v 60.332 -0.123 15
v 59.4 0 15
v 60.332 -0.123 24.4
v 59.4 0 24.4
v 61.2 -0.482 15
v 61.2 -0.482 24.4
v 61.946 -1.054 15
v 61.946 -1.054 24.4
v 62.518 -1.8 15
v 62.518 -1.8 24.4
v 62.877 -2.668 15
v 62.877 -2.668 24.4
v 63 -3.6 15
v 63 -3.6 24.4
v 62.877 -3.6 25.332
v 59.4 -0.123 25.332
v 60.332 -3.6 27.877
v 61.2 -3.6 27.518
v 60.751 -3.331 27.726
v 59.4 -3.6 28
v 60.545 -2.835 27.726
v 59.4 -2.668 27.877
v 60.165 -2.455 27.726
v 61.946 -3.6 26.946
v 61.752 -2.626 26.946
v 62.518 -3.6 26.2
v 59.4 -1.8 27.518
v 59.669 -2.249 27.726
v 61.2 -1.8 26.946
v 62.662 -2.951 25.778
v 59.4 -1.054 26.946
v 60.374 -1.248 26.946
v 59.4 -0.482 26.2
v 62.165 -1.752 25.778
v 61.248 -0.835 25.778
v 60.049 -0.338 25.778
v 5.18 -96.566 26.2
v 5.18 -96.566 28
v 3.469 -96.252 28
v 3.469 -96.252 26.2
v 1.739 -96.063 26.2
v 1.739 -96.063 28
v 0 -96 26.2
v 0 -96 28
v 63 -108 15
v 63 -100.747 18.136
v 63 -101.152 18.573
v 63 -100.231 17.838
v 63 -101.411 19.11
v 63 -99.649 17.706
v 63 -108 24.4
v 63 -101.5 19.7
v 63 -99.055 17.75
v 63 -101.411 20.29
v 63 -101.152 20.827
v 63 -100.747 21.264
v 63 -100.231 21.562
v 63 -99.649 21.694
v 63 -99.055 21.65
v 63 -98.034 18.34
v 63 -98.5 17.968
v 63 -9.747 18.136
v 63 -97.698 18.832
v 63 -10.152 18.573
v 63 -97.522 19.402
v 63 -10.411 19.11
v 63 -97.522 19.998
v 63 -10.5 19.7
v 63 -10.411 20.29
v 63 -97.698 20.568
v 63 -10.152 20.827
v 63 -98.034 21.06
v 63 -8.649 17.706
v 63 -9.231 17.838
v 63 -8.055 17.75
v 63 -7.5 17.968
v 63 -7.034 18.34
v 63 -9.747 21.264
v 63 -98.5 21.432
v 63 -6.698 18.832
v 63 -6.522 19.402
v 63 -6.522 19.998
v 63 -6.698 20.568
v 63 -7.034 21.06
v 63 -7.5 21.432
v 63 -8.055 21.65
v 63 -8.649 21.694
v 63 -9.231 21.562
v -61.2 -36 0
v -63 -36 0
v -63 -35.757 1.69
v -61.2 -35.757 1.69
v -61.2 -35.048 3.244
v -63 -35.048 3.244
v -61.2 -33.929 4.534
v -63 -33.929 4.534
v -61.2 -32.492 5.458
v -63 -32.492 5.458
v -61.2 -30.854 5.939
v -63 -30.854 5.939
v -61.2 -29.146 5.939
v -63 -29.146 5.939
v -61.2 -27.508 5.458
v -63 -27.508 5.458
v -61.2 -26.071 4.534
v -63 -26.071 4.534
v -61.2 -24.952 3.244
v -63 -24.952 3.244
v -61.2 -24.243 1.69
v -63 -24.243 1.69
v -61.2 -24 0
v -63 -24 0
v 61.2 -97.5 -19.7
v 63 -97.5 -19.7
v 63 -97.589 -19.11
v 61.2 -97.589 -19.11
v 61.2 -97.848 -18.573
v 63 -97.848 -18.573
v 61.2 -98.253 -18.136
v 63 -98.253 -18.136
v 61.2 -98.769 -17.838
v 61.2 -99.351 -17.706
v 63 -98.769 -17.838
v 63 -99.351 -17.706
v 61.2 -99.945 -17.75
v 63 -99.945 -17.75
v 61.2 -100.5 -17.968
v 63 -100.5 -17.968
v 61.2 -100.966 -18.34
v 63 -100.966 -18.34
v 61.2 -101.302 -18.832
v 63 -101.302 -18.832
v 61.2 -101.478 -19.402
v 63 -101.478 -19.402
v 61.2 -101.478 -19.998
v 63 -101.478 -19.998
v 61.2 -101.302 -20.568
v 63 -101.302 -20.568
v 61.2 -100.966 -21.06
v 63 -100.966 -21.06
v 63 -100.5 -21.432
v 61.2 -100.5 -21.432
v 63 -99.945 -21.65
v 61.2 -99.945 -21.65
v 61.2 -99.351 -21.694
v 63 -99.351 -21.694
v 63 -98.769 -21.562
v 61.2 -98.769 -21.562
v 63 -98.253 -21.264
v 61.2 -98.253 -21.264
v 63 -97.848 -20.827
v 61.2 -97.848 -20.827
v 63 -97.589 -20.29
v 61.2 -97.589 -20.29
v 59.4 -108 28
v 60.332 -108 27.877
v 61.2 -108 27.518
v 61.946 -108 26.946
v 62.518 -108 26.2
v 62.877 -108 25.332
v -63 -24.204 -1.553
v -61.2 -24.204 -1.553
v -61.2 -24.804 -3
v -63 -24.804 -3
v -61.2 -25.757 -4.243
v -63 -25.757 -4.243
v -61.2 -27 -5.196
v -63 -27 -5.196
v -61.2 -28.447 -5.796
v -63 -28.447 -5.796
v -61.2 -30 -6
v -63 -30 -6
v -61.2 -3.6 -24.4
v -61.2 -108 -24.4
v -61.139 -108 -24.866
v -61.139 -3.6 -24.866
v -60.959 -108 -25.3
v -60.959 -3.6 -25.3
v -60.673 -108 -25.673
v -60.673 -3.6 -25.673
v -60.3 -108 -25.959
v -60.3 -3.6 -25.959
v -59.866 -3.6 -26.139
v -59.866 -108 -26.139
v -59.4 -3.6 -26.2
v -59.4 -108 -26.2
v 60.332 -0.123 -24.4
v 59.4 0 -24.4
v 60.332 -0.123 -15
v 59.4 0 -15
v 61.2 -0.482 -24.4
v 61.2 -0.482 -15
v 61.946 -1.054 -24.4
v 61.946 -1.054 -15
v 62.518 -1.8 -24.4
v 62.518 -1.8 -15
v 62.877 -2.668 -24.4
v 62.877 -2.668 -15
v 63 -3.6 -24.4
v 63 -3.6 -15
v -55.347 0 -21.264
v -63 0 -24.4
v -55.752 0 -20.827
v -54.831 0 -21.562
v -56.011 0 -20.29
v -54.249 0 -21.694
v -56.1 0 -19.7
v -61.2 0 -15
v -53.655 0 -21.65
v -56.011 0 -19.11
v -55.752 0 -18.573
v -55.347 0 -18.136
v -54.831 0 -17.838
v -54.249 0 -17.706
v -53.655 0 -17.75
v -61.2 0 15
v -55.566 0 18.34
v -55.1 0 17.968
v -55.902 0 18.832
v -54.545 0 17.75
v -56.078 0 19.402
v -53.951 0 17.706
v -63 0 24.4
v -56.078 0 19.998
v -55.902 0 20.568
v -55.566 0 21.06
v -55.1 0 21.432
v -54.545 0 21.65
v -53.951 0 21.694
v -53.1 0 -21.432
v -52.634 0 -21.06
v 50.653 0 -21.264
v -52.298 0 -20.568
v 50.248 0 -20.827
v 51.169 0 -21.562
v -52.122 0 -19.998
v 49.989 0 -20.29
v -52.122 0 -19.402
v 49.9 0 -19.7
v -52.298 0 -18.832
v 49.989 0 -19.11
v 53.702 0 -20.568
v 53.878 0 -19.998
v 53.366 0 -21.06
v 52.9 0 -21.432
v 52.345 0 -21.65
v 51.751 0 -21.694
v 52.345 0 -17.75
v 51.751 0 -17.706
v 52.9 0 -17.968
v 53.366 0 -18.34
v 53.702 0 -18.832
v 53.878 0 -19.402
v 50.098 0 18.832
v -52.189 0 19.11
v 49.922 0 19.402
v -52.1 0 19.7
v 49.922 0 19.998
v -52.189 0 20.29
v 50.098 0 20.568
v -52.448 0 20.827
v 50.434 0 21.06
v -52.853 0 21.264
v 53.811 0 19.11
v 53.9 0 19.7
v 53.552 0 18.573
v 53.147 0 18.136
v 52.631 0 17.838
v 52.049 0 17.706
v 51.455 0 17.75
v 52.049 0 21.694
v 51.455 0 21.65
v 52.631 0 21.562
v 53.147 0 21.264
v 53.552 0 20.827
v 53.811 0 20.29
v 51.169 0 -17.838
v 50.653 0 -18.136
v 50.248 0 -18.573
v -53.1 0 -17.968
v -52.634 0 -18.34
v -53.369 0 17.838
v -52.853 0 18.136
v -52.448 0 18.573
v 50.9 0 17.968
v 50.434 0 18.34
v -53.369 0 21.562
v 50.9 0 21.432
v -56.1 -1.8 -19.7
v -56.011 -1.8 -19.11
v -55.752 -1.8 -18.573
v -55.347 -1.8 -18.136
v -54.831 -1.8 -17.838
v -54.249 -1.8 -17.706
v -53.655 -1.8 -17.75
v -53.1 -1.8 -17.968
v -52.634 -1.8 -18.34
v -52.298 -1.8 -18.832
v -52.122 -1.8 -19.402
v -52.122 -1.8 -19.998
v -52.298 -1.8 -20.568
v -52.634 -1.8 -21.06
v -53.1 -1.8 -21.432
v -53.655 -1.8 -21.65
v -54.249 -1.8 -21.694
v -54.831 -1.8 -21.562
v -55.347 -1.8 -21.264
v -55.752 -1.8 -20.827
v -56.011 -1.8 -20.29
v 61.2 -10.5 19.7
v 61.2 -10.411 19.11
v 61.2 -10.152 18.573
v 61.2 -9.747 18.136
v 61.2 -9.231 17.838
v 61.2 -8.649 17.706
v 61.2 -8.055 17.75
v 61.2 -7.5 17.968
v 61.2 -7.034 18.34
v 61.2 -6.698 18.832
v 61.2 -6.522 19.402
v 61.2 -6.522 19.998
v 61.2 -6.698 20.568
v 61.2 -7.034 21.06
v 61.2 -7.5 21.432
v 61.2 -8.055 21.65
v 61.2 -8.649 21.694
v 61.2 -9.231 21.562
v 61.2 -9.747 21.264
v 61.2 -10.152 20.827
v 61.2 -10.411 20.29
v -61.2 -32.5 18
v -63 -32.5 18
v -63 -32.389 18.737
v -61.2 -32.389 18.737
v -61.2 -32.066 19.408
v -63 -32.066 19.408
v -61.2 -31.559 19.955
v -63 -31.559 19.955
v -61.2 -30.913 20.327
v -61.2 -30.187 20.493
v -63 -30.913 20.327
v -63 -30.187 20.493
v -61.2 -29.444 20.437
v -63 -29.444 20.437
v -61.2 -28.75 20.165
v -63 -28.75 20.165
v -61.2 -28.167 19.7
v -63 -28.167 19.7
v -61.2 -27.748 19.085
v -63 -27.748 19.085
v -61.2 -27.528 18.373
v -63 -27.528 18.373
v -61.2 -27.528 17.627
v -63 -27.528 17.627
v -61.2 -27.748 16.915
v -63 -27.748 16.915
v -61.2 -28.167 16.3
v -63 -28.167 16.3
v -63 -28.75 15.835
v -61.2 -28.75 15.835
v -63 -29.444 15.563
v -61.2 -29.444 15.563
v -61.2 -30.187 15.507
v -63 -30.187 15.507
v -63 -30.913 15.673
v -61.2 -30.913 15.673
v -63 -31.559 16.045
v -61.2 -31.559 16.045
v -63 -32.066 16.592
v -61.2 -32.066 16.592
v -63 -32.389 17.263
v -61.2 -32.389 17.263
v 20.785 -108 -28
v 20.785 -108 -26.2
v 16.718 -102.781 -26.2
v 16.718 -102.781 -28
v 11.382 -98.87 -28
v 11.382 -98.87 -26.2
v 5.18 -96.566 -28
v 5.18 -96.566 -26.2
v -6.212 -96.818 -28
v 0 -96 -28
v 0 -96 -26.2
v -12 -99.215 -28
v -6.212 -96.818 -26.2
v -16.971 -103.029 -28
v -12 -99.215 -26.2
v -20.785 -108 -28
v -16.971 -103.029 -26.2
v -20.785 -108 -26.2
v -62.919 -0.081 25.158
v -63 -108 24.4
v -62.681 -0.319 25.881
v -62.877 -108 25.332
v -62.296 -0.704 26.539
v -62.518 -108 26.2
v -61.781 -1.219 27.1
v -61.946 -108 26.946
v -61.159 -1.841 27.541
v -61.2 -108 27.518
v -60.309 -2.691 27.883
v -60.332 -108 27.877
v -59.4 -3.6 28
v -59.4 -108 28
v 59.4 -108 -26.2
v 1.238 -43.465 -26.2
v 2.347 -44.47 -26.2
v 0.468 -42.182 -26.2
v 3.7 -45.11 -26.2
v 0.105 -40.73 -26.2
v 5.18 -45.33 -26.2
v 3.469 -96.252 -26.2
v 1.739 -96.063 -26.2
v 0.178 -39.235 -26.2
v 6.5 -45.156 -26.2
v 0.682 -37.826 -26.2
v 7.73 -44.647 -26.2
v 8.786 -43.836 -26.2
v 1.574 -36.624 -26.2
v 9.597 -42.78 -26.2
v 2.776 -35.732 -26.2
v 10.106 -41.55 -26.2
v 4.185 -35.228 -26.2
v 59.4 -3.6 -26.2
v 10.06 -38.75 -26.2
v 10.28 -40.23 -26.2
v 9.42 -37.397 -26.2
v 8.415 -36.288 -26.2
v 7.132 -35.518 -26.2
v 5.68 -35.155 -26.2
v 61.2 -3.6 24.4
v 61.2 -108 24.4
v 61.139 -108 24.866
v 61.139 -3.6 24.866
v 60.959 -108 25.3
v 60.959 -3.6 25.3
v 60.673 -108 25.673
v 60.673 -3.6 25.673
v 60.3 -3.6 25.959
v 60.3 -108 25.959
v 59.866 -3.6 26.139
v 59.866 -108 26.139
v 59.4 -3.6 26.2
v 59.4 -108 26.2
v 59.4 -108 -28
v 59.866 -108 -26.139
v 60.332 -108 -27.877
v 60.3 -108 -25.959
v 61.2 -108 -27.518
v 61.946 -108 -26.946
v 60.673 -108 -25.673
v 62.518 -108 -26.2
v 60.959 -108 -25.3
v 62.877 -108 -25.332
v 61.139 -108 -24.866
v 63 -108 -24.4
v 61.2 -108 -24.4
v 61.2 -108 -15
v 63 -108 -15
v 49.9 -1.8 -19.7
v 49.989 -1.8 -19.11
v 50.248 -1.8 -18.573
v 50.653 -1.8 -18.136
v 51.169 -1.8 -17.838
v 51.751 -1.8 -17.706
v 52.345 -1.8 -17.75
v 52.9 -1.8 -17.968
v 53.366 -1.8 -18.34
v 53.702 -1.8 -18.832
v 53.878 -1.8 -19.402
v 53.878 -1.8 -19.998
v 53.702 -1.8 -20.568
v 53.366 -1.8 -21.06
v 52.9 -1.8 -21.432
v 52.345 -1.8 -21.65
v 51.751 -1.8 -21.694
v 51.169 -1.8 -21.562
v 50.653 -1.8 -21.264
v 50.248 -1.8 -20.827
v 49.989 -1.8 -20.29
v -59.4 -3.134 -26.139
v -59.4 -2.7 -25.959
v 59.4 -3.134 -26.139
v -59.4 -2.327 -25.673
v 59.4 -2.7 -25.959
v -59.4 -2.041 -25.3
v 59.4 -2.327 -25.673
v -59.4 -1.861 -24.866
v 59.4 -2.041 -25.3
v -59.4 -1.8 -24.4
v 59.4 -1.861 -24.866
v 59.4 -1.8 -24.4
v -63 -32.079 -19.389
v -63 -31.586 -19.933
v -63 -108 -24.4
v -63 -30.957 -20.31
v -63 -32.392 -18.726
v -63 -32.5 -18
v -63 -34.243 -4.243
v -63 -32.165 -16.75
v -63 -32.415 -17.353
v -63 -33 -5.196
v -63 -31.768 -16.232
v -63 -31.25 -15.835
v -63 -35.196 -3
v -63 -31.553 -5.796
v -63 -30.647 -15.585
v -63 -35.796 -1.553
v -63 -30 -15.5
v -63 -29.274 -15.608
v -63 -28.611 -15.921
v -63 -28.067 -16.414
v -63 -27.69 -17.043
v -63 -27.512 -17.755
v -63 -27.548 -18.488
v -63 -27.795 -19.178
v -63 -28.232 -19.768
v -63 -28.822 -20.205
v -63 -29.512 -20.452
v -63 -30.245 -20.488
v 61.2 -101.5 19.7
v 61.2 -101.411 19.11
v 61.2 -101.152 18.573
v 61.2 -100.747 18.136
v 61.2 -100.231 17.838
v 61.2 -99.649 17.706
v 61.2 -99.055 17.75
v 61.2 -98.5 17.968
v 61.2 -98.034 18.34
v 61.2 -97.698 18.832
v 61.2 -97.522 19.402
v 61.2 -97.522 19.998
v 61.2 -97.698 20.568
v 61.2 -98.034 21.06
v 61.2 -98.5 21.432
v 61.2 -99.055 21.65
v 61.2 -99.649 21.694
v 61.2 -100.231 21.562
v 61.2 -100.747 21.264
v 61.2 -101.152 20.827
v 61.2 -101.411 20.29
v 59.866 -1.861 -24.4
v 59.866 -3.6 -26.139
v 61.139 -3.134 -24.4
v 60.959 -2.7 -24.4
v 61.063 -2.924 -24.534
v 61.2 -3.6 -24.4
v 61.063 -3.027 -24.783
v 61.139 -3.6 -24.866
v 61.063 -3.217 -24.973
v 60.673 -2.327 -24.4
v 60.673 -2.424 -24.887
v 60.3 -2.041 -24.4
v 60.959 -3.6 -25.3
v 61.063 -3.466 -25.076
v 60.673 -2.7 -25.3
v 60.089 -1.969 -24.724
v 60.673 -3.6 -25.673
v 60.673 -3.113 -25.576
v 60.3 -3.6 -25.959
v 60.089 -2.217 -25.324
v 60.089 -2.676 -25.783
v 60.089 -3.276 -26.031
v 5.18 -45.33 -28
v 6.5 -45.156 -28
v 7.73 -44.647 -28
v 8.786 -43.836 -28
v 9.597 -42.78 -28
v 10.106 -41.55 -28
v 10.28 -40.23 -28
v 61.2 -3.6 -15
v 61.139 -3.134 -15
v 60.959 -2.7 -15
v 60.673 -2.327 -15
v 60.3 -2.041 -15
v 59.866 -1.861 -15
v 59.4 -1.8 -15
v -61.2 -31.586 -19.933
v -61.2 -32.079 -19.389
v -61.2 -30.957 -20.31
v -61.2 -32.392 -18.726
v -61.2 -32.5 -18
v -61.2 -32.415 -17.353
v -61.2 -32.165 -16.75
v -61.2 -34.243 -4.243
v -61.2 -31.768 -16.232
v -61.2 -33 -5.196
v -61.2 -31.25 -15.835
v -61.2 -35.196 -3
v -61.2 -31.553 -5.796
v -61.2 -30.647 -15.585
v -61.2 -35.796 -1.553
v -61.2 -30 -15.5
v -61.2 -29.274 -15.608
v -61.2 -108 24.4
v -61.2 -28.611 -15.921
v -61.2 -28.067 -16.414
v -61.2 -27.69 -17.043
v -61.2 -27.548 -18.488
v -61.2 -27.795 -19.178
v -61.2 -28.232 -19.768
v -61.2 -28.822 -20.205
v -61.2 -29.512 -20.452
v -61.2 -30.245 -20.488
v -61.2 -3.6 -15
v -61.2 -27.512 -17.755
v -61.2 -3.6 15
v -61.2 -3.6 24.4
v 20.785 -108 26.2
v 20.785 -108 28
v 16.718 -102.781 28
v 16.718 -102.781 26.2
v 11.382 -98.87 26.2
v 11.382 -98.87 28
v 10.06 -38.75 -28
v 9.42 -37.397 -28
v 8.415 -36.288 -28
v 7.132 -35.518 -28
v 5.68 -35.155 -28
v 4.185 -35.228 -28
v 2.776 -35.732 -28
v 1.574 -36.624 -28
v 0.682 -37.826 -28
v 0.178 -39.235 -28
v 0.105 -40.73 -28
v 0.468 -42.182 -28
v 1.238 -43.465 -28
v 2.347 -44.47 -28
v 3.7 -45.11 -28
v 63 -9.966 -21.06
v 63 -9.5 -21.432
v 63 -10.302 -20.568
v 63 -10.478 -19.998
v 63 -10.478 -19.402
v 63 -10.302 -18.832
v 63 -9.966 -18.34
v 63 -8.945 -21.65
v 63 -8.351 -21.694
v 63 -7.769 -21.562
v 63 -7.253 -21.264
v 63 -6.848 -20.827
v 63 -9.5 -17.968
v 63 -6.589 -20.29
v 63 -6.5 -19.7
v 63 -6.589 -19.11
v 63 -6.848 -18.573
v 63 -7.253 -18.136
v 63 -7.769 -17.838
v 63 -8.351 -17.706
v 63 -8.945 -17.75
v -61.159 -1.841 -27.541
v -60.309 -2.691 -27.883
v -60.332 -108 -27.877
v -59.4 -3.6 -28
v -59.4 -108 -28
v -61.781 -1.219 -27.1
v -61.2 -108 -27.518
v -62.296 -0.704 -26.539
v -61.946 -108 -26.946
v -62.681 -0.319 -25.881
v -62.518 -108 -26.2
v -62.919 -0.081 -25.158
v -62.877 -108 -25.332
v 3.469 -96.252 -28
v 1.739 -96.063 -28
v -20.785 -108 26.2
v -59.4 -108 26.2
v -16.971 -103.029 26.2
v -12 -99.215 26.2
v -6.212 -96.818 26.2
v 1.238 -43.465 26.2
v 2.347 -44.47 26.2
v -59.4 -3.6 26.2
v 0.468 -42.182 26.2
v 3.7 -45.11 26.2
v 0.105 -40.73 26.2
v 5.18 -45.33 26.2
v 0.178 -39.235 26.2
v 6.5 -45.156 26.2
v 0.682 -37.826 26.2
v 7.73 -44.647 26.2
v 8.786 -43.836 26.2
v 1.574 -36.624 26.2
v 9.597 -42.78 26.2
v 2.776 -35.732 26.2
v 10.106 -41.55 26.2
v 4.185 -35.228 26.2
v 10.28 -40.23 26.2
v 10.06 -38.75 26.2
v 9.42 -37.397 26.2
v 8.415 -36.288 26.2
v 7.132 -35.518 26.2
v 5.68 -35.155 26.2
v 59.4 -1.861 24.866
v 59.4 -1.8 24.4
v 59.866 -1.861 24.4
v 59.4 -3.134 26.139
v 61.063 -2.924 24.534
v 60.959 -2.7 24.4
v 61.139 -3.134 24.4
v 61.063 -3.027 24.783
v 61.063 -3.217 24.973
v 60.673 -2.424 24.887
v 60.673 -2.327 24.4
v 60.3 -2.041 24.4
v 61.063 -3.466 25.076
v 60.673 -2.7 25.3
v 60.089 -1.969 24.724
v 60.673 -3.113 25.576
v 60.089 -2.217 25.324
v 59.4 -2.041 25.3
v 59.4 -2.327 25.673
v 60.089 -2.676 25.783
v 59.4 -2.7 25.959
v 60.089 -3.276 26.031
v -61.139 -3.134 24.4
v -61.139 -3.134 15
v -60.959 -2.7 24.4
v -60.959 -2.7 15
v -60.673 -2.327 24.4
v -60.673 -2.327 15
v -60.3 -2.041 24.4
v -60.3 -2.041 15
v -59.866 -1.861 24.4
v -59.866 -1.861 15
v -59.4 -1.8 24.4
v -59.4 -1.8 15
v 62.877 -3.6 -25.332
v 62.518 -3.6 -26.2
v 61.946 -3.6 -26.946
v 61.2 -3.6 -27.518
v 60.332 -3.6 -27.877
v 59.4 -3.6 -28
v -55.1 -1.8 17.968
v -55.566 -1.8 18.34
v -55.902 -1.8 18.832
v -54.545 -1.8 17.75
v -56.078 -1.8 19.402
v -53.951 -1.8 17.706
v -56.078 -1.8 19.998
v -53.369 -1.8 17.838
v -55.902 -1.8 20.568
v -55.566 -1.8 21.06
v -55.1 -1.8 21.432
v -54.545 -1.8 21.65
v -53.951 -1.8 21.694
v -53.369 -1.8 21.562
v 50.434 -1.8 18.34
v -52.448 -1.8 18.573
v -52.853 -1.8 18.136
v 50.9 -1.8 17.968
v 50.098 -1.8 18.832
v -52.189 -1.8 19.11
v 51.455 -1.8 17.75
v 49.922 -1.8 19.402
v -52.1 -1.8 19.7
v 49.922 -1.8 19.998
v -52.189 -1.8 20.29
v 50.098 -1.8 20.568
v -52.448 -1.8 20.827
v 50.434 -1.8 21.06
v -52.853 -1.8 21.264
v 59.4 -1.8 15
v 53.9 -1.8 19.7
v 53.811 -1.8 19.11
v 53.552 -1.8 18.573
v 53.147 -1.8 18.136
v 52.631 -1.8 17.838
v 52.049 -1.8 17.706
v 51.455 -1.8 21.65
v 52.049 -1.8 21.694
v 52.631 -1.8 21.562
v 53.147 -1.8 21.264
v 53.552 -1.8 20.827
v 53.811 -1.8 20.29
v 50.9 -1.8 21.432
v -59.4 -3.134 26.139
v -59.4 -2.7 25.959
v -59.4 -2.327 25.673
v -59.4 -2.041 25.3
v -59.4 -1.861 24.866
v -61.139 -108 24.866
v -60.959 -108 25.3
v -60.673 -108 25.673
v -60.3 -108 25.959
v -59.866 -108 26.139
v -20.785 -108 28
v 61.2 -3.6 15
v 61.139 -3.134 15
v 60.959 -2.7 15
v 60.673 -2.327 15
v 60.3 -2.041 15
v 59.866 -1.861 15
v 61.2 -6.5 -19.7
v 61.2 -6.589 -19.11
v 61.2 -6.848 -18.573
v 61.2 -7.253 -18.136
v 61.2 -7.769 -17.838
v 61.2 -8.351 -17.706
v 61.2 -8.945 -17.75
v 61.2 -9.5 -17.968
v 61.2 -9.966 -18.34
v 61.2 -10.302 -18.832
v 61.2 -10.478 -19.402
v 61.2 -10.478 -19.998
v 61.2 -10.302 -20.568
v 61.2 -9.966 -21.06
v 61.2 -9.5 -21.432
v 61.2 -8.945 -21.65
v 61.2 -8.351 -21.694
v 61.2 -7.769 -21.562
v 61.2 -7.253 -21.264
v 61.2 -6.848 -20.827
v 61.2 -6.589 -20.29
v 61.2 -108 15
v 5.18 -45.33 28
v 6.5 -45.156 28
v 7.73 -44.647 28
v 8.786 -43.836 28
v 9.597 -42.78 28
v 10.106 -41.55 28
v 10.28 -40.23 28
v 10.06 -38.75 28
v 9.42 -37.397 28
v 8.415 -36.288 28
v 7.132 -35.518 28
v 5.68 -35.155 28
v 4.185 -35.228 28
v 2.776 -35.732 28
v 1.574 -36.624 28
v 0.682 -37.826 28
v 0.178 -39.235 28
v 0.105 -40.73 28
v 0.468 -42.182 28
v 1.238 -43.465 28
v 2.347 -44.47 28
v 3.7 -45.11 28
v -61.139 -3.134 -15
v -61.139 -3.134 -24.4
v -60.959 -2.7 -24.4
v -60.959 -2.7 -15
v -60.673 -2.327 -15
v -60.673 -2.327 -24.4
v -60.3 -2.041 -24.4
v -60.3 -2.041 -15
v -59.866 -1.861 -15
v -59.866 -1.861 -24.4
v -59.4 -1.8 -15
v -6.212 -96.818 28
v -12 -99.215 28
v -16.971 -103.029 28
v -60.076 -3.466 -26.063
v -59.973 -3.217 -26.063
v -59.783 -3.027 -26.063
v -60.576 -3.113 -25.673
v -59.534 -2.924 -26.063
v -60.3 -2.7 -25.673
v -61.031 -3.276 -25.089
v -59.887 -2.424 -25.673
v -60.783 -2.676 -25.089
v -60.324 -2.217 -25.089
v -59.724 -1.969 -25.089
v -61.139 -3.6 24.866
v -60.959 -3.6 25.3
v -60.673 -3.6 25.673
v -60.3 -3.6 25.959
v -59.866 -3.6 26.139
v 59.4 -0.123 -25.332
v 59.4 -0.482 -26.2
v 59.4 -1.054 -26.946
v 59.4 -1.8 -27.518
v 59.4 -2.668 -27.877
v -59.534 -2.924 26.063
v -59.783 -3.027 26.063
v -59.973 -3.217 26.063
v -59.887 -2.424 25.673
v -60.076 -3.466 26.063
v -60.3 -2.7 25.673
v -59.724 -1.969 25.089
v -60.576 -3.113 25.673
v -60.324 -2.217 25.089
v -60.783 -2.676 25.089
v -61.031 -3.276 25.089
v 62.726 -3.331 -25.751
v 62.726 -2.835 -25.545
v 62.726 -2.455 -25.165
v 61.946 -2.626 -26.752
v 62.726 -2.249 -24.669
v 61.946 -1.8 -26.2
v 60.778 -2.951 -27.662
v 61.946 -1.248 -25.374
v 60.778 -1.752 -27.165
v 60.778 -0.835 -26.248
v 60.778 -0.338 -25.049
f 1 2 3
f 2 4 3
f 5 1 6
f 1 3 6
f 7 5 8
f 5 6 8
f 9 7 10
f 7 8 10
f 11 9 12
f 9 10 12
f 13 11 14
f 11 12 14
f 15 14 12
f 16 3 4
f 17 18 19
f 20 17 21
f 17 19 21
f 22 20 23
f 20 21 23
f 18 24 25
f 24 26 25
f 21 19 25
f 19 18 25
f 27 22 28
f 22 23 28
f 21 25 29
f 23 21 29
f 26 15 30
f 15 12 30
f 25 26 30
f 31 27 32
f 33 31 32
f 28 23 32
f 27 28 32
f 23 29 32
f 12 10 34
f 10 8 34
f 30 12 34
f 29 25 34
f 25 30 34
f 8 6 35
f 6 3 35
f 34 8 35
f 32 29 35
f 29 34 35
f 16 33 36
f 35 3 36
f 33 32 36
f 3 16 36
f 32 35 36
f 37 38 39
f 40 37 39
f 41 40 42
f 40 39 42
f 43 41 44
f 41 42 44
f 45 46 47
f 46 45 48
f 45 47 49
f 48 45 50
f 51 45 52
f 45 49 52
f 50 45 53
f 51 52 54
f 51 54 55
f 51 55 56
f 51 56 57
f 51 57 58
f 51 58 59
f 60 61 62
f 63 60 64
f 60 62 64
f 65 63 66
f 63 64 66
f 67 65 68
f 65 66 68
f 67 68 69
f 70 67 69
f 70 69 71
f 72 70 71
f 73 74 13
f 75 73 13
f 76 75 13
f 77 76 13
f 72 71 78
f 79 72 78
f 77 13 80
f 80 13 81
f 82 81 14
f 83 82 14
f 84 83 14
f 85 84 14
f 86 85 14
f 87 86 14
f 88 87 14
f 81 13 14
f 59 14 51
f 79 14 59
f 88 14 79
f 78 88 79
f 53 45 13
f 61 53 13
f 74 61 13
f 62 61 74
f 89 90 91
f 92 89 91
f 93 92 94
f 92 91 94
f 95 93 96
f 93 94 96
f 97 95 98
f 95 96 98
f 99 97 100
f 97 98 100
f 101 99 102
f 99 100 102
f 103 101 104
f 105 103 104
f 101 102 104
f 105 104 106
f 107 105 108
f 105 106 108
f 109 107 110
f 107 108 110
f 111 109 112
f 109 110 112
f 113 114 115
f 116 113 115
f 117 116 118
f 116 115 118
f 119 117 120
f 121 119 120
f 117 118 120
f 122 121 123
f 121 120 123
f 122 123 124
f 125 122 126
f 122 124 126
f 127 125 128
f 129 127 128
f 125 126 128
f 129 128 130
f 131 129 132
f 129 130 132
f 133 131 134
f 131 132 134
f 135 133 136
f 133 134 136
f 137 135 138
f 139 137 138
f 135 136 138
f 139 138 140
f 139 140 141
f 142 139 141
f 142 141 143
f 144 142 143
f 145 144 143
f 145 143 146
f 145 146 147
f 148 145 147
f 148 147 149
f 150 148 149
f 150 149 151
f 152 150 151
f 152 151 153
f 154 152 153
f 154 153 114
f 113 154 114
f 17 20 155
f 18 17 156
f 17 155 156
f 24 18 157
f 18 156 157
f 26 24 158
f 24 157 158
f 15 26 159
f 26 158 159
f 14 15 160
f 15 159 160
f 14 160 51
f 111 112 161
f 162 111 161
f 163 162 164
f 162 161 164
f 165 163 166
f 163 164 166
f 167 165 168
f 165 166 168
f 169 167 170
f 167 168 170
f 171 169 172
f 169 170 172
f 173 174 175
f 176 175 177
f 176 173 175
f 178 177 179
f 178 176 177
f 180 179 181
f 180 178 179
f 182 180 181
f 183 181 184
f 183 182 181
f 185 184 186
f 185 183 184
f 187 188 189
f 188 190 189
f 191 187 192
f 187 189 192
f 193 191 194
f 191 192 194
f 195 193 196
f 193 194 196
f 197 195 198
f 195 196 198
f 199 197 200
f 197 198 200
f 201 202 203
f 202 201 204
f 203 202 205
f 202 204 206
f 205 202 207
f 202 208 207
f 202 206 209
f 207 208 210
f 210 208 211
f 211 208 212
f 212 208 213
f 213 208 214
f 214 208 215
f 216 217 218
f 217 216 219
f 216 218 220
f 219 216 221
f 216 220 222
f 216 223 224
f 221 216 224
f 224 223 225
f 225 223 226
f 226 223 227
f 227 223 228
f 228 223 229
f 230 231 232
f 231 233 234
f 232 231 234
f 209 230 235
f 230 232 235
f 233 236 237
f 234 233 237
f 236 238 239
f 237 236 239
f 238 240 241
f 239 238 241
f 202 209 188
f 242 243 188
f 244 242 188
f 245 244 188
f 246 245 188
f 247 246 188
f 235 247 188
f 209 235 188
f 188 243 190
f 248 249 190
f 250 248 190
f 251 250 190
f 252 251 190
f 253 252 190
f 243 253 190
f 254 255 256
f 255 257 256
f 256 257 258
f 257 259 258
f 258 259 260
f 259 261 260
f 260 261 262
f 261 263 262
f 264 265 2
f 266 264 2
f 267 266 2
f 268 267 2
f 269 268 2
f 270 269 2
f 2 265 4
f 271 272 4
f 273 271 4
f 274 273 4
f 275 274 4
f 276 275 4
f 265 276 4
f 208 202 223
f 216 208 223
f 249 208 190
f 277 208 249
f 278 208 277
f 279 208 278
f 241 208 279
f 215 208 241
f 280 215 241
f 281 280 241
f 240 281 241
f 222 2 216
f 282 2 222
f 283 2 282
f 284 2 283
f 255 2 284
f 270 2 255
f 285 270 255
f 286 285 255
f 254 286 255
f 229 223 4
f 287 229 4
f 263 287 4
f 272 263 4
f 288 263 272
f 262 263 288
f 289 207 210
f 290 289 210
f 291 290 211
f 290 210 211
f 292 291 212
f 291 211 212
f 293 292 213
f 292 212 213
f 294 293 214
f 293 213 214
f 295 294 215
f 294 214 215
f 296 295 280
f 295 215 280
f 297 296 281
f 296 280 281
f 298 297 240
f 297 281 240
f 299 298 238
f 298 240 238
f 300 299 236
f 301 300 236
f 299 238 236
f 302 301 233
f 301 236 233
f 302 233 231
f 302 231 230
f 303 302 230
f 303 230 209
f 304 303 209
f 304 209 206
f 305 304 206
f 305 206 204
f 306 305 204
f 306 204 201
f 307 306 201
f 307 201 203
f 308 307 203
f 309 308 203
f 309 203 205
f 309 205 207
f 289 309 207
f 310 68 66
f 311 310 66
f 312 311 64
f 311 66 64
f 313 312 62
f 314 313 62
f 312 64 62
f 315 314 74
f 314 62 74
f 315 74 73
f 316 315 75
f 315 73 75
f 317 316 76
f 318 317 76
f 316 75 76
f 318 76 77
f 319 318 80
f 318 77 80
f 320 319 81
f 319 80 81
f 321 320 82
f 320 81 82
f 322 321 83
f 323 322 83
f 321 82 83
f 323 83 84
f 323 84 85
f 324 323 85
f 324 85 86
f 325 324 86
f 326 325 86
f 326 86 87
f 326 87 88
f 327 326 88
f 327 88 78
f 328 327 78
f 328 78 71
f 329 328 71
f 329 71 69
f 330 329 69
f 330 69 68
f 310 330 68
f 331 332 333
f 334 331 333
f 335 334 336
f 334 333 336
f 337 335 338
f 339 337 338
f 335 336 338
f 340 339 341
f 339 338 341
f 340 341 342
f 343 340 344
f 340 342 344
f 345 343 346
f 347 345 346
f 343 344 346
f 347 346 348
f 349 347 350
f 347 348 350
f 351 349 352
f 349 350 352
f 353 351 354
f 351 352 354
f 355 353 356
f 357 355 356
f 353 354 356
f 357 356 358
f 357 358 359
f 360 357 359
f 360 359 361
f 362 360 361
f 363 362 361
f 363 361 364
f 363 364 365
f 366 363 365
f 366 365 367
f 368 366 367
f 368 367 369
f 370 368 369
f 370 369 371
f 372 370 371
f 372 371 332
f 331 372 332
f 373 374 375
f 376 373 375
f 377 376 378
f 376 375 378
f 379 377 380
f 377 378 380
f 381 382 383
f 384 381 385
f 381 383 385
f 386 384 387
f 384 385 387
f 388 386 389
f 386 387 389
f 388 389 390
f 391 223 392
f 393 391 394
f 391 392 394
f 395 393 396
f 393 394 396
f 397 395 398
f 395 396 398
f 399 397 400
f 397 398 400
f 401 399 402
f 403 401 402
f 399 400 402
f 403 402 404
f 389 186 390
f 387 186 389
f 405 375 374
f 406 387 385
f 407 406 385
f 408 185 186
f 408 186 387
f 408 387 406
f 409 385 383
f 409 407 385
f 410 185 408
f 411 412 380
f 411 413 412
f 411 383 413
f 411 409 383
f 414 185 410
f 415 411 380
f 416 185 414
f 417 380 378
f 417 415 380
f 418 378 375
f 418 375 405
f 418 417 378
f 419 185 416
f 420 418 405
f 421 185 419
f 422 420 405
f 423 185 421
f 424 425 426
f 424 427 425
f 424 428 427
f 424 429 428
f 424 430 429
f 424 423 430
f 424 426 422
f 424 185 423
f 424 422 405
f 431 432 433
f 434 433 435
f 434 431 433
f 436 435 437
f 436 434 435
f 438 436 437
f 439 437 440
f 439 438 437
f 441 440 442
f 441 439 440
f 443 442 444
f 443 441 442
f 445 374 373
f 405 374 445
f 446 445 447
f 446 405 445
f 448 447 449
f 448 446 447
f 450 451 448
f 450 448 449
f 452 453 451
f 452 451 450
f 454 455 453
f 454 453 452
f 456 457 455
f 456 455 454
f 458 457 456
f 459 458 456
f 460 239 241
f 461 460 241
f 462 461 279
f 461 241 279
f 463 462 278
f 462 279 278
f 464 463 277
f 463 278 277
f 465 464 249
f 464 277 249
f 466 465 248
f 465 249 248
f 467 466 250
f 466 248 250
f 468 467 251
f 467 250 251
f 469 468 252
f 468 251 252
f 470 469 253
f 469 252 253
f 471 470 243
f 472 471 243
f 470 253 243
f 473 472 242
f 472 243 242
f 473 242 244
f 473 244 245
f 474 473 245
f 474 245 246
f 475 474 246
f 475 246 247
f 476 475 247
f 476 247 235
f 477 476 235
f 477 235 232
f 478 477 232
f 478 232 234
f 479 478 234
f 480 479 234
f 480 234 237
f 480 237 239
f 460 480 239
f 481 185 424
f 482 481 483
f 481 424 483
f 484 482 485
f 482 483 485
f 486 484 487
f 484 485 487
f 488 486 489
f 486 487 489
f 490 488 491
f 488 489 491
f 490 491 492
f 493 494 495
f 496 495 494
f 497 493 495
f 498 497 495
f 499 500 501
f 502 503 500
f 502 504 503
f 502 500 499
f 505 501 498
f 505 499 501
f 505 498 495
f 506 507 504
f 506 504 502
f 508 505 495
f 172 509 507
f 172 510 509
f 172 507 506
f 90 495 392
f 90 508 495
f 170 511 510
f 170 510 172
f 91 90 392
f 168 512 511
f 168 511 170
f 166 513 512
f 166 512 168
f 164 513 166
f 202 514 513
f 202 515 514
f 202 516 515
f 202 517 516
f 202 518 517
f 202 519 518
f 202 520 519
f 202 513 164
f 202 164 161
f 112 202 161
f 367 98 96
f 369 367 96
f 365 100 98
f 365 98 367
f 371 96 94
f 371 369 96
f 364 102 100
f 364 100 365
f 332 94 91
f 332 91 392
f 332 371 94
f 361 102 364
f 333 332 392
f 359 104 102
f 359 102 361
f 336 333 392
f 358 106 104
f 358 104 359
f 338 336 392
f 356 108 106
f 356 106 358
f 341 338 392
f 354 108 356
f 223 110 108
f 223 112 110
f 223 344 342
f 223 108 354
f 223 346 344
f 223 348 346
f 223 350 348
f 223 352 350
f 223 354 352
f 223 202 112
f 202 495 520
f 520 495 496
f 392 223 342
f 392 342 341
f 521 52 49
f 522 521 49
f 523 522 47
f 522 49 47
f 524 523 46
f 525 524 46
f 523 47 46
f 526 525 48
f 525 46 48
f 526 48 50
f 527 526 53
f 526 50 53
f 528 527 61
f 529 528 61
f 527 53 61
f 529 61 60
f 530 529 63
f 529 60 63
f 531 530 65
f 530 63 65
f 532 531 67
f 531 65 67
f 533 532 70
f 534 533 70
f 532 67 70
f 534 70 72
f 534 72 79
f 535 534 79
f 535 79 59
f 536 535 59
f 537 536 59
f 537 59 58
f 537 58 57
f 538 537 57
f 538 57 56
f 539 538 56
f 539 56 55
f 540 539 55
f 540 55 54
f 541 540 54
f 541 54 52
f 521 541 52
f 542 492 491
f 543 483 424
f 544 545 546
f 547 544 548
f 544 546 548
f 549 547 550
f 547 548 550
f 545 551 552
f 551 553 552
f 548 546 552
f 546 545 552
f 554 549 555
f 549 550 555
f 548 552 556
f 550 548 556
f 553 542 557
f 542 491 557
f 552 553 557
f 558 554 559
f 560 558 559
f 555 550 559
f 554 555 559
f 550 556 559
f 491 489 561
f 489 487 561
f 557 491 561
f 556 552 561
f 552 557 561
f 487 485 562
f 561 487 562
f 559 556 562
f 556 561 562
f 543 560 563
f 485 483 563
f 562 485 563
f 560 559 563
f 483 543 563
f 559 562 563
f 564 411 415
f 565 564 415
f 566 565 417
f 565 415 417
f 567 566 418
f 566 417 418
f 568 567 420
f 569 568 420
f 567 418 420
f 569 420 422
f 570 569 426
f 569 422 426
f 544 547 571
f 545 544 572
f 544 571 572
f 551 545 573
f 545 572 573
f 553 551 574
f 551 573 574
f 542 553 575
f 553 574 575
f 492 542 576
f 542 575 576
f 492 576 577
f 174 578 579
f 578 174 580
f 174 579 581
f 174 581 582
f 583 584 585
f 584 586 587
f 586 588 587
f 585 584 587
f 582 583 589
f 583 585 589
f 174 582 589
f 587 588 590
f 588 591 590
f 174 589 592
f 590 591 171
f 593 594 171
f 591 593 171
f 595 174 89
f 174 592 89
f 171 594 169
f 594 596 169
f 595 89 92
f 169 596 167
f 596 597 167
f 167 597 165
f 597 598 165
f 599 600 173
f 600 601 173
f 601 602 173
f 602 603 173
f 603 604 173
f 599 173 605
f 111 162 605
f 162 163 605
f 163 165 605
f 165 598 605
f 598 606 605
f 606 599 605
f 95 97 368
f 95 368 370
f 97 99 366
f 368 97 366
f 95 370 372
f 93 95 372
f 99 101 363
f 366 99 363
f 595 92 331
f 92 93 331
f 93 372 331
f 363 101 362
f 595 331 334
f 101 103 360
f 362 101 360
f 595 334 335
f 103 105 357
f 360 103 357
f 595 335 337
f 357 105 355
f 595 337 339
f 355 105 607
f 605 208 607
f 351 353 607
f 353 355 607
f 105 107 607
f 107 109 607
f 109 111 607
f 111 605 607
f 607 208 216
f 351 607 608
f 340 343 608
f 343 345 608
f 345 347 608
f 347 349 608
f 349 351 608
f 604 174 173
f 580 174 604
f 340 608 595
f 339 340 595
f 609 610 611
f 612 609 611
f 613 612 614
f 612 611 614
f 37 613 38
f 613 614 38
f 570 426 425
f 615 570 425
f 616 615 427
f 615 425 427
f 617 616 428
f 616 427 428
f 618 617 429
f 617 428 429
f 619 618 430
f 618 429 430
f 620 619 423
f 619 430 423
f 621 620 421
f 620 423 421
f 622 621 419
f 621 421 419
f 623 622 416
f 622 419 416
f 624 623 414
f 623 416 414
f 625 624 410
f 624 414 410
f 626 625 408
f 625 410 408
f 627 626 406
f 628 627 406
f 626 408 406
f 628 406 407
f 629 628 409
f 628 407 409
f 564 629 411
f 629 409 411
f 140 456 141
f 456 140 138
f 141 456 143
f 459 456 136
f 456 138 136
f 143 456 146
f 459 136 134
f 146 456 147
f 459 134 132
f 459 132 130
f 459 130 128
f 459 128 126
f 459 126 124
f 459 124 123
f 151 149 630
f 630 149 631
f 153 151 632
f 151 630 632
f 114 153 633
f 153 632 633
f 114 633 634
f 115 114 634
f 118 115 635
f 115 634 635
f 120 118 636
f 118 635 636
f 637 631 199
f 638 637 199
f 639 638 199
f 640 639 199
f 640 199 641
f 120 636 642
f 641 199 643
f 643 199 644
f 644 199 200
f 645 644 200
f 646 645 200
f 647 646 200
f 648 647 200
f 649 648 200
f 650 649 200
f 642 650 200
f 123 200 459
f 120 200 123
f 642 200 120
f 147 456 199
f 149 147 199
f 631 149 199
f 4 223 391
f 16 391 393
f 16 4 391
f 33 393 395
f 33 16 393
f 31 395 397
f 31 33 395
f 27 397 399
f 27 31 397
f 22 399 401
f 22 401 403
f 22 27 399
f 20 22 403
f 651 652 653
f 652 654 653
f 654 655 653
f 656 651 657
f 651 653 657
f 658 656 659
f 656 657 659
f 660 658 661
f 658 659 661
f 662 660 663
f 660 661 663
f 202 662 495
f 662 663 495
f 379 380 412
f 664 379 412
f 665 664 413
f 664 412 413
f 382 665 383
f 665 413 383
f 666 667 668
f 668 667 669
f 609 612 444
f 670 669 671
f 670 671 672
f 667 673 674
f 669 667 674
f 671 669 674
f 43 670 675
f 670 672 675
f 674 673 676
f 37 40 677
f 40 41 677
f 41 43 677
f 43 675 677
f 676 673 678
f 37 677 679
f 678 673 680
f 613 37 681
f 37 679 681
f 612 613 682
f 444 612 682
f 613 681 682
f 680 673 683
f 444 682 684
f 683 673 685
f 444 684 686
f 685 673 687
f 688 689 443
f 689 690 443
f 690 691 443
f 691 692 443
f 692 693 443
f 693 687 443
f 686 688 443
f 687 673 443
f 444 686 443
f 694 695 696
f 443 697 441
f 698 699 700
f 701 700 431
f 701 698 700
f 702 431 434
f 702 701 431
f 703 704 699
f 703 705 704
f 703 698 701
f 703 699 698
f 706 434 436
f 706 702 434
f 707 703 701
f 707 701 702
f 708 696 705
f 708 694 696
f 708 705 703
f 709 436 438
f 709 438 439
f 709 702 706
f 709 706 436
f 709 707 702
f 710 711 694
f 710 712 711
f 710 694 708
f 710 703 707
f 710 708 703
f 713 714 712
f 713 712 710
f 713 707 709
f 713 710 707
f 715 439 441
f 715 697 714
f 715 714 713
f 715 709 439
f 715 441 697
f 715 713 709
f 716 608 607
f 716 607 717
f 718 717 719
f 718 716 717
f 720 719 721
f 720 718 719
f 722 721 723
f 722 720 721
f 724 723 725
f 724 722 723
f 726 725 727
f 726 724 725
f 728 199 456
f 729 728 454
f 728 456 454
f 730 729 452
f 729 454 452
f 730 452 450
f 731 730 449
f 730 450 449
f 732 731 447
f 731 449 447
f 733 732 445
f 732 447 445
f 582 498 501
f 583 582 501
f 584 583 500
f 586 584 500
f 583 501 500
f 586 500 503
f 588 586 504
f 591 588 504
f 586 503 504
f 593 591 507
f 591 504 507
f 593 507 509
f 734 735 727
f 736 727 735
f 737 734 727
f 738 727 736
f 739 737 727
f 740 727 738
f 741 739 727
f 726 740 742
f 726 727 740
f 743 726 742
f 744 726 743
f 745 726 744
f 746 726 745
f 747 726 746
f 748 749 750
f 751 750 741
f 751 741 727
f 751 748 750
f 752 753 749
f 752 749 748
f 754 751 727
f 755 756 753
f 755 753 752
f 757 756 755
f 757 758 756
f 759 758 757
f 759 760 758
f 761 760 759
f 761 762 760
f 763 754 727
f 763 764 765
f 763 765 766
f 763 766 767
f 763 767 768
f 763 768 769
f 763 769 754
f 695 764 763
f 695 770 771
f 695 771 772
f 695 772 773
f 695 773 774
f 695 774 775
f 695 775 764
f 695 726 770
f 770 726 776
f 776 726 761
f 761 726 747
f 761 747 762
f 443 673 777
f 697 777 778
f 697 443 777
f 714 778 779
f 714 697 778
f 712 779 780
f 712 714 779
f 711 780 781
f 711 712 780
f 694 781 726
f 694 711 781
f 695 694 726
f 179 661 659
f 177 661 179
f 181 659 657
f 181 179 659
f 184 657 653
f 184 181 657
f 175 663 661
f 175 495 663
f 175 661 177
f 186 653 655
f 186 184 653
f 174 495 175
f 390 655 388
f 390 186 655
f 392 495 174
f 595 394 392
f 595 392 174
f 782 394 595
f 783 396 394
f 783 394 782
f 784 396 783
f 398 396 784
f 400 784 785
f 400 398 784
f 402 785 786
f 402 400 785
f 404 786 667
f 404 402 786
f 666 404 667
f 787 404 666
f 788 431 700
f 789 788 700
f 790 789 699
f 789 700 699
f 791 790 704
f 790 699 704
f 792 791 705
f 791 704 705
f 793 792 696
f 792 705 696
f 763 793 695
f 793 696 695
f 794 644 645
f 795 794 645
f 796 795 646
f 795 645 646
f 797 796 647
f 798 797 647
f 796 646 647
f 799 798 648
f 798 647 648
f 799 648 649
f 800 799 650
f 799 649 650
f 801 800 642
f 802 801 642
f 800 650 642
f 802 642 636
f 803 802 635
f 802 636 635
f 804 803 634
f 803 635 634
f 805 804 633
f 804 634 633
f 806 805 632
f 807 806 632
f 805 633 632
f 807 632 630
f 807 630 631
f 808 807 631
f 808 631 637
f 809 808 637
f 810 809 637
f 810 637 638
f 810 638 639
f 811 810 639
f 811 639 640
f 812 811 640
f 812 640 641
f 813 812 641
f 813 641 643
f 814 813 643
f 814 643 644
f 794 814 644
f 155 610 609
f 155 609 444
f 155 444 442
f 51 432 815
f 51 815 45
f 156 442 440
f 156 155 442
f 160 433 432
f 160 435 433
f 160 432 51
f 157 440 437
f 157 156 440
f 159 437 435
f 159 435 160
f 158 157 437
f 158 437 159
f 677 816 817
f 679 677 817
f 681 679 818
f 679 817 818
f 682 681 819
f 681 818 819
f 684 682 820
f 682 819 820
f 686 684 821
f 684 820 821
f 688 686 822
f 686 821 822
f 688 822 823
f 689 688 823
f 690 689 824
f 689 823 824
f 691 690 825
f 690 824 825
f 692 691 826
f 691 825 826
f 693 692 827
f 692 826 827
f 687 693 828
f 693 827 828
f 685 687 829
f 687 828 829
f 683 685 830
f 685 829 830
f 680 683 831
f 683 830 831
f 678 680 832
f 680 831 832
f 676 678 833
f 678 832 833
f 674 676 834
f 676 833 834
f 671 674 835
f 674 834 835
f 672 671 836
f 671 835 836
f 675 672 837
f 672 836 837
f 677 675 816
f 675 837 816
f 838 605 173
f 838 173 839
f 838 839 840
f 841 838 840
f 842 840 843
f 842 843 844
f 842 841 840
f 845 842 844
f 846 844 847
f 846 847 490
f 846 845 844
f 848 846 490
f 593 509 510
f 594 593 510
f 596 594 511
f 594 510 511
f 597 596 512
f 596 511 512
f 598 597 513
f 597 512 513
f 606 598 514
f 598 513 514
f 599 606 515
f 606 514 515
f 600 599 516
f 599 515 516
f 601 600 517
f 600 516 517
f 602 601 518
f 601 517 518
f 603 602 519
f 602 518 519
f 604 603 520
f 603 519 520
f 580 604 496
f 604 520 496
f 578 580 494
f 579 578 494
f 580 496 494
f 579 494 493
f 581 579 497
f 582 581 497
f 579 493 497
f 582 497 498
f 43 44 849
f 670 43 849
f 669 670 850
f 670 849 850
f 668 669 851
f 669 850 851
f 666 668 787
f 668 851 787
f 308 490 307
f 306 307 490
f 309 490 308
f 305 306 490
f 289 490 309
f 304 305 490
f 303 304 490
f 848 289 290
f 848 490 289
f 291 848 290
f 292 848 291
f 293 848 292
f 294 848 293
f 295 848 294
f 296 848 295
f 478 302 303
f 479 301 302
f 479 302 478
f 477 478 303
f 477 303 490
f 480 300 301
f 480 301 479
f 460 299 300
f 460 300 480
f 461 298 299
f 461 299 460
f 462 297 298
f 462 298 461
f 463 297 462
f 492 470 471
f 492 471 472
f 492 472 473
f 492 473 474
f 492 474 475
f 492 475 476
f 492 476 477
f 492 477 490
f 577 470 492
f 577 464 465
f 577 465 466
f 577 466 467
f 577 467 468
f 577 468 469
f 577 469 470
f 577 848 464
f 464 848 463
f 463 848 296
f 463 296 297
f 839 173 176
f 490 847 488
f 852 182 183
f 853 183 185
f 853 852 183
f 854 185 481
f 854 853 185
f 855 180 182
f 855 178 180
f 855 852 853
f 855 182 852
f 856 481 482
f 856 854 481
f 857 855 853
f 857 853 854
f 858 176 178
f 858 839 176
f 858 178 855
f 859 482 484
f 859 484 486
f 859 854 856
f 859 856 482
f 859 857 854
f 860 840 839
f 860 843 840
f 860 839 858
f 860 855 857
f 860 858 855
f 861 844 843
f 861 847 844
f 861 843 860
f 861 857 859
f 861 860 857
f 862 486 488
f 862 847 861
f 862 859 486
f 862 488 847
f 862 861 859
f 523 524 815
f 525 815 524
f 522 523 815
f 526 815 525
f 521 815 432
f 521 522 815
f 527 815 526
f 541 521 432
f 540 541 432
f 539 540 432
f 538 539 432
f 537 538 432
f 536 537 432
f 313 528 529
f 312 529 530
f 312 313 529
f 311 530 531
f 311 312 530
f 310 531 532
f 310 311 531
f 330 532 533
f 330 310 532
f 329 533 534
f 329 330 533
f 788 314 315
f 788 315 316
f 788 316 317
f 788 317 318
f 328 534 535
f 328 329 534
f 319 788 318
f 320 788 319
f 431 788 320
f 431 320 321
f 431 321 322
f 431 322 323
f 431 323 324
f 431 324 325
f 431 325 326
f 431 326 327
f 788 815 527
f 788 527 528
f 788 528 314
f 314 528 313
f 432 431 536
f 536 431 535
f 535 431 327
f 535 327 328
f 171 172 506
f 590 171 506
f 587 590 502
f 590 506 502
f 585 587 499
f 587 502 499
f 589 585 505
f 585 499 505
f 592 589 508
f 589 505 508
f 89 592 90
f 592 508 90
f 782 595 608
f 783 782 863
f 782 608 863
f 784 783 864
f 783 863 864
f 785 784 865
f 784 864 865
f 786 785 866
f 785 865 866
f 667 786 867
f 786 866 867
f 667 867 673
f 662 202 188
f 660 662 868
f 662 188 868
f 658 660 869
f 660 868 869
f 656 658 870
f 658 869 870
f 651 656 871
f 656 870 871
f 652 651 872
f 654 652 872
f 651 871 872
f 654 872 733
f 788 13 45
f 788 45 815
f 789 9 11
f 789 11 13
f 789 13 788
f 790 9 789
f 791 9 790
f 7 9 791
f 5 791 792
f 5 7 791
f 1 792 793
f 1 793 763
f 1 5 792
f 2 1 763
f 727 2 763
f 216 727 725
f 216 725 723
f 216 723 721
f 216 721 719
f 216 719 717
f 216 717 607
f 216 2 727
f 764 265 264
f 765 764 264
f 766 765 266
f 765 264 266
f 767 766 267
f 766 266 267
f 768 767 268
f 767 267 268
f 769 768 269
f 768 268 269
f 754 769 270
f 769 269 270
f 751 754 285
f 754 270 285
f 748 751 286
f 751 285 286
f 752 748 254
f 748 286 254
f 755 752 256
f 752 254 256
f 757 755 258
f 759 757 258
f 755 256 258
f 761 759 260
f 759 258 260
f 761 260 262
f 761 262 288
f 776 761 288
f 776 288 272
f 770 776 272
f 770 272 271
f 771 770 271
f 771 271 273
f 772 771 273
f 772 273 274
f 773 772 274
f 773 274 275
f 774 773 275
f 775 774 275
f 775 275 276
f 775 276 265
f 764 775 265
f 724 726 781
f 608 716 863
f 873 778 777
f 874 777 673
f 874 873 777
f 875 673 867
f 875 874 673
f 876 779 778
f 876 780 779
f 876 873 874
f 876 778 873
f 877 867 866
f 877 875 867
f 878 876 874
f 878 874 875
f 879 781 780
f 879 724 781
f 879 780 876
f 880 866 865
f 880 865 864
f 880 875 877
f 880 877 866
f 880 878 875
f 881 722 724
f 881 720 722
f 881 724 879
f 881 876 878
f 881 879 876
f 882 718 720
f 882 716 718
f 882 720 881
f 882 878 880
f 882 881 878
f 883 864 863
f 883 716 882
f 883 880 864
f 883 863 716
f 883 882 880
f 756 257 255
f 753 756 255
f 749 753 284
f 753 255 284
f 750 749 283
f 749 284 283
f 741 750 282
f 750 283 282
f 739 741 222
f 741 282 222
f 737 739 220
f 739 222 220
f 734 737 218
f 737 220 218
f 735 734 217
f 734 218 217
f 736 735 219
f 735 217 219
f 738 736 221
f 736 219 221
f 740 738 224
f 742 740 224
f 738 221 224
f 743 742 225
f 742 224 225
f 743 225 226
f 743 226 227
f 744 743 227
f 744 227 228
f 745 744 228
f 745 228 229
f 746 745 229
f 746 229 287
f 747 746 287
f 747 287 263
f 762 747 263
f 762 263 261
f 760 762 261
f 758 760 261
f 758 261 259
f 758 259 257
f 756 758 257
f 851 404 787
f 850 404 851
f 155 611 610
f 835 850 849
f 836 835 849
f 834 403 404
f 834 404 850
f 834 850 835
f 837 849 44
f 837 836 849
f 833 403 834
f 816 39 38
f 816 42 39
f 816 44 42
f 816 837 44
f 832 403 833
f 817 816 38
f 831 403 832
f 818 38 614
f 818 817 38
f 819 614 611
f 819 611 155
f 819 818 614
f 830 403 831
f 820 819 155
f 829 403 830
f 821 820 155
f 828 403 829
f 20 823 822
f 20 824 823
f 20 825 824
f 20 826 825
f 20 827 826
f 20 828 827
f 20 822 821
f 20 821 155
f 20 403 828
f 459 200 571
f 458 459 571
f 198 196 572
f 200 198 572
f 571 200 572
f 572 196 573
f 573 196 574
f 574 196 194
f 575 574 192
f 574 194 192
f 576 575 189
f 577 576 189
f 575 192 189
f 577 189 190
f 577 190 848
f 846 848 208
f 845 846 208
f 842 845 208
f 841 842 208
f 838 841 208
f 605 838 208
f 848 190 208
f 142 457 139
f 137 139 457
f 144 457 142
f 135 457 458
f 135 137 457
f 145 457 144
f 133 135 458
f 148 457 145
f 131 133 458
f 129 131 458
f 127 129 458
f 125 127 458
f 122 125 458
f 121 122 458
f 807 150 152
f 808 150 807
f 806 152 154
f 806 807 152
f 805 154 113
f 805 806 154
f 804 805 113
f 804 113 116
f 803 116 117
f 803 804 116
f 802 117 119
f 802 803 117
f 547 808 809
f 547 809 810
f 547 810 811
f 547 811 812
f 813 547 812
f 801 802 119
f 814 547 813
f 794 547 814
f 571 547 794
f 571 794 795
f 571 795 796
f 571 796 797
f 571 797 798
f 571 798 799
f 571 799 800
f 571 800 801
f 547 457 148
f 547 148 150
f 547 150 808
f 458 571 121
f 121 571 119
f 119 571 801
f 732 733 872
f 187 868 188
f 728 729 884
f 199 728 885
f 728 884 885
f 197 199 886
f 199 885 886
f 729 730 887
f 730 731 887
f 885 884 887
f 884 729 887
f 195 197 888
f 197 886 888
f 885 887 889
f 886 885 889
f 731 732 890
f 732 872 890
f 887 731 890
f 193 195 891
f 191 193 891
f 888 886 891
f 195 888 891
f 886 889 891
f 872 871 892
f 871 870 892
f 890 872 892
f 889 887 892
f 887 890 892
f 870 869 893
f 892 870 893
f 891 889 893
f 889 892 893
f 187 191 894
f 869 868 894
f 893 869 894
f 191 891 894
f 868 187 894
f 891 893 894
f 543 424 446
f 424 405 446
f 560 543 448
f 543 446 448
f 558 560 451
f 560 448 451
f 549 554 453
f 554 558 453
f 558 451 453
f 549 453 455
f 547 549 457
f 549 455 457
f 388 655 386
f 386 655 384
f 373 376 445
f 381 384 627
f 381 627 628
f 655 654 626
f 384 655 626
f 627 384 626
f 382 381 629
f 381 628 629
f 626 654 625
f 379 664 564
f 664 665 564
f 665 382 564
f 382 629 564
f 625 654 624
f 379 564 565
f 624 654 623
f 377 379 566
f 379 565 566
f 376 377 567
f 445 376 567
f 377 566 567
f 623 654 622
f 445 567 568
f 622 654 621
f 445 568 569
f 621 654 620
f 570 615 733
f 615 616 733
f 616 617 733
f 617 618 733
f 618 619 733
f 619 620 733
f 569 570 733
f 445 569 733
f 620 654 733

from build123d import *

# Parameters (mm, degrees)
F0_W      = 126
F0_H      = 56
F1_DEPTH  = 108
F2_T      = -1.8
F3_R      = 1.8
F4_R      = 2.5
F5_DEPTH  = 25
F6_W      = 124.2
F6_H      = 30
F7_DEPTH  = 120
F8_R      = 3.6
F10_DEPTH = 56
F11_R     = 2
F12_DEPTH = 25
F13_R     = 2
F14_DEPTH = 25


with BuildPart() as f1:
    # F0 (on Front) → F1 (new body)
    with BuildSketch(Plane.XZ):
        Rectangle(F0_W, F0_H)
    extrude(amount=F1_DEPTH)

    # F2
    f2_openings = [f1.faces().sort_by_distance(p)[0] for p in [
        (0, -108, 0),
    ]]
    offset(amount=F2_T, openings=f2_openings)

    # F3
    f3_edges = [f1.edges().sort_by_distance(p)[0] for p in [
        (-61.2, -1.8, 0),
        (-61.2, -54.9, -26.2),
        (0, -1.8, -26.2),
        (0, -1.8, 26.2),
        (-61.2, -54.9, 26.2),
        (61.2, -1.8, 0),
        (61.2, -54.9, 26.2),
        (61.2, -54.9, -26.2),
    ]]
    fillet(f3_edges, radius=F3_R)

    # F4 (on face) → F5 (cut)
    with BuildSketch(Plane(origin=(-63, 0, 0), x_dir=(0, -1, 0), z_dir=(-1, 0, 0))):
        with BuildLine():
            ThreePointArc((36, 0), (30, 6), (24, 0))
            Line((24, 0), (30, 0))
            Line((30, 0), (30, -6))
            ThreePointArc((30, -6), (34.2426406871, -4.2426406871), (36, 0))
        make_face()
        with BuildLine():
            ThreePointArc((32.5, -18), (31.767766953, -16.232233047), (30, -15.5))
            ThreePointArc((30, -15.5), (28.232233047, -19.767766953), (32.5, -18))
        make_face()
        with BuildLine():
            Line((30, 0), (24, 0))
            ThreePointArc((24, 0), (25.7573593129, -4.2426406871), (30, -6))
            Line((30, -6), (30, 0))
        make_face()
        with Locations((30, 18)):
            Circle(F4_R)
    extrude(amount=-F5_DEPTH, mode=Mode.SUBTRACT)

    # F6 (on face) → F7 (cut)
    with BuildSketch(Plane(origin=(0, 0, 0), x_dir=(-1, 0, 0), z_dir=(0, 1, 0))):
        with Locations((-0.9, 0)):
            Rectangle(F6_W, F6_H)
    extrude(amount=-F7_DEPTH, mode=Mode.SUBTRACT)

    # F8
    f8_edges = [f1.edges().sort_by_distance(p)[0] for p in [
        (0, 0, -28),
        (63, -54, -28),
        (63, 0, -21.5),
        (63, 0, 21.5),
        (63, -54, 28),
        (0, 0, 28),
        (-63, -54, 28),
        (-63, -54, -28),
    ]]
    fillet(f8_edges, radius=F8_R)

    # F9 (on face) → F10 (cut)
    with BuildSketch(Plane.XY.offset(28)):
        with BuildLine():
            Line((20.7846096908, -108), (5.18, -108))
            Line((5.18, -108), (0, -108))
            Line((0, -108), (0, -96))
            ThreePointArc((0, -96), (-16.9705627485, -136.9705627485), (24, -120))
            ThreePointArc((24, -120), (23.1822198309, -113.7883429175), (20.7846096908, -108))
        make_face()
        with BuildLine():
            Line((5.18, -96.5656747484), (5.18, -108))
            Line((5.18, -108), (20.7846096908, -108))
            ThreePointArc((20.7846096908, -108), (14.1854216571, -100.6409242883), (5.18, -96.5656747484))
        make_face()
        with BuildLine():
            Line((0, -108), (5.18, -108))
            Line((5.18, -108), (5.18, -96.5656747484))
            ThreePointArc((5.18, -96.5656747484), (2.6053976626, -96.1418378114), (0, -96))
            Line((0, -96), (0, -108))
        make_face()
        with BuildLine():
            ThreePointArc((10.28, -40.23), (1.5737554159, -36.6237554159), (5.18, -45.33))
            ThreePointArc((5.18, -45.33), (8.7862445841, -43.8362445841), (10.28, -40.23))
        make_face()
    extrude(amount=-F10_DEPTH, mode=Mode.SUBTRACT)

    # F11 (on face) → F12 (cut)
    with BuildSketch(Plane.YZ.offset(63)):
        with BuildLine():
            ThreePointArc((-97.5, 19.7), (-99.5, 21.7), (-101.5, 19.7))
            Line((-101.5, 19.7), (-99.5, 19.7))
            Line((-99.5, 19.7), (-97.5, 19.7))
        make_face()
        with BuildLine():
            ThreePointArc((-6.5, 19.7), (-8.5, 21.7), (-10.5, 19.7))
            ThreePointArc((-10.5, 19.7), (-8.5, 17.7), (-6.5, 19.7))
        make_face()
        with BuildLine():
            Line((-99.5, 19.7), (-101.5, 19.7))
            ThreePointArc((-101.5, 19.7), (-99.5, 17.7), (-97.5, 19.7))
            Line((-97.5, 19.7), (-99.5, 19.7))
        make_face()
        with Locations((-8.5, -19.7)):
            Circle(F11_R)
        with Locations((-99.5, -19.7)):
            Circle(F11_R)
    extrude(amount=-F12_DEPTH, mode=Mode.SUBTRACT)

    # F13 (on face) → F14 (cut)
    with BuildSketch(Plane(origin=(0, 0, 0), x_dir=(-1, 0, 0), z_dir=(0, 1, 0))):
        with BuildLine():
            ThreePointArc((-49.9, 19.7), (-51.9, 21.7), (-53.9, 19.7))
            Line((-53.9, 19.7), (-51.9, 19.7))
            Line((-51.9, 19.7), (-49.9, 19.7))
        make_face()
        with BuildLine():
            ThreePointArc((56.1, 19.7), (54.1, 21.7), (52.1, 19.7))
            ThreePointArc((52.1, 19.7), (54.1, 17.7), (56.1, 19.7))
        make_face()
        with BuildLine():
            Line((-51.9, 19.7), (-53.9, 19.7))
            ThreePointArc((-53.9, 19.7), (-51.9, 17.7), (-49.9, 19.7))
            Line((-49.9, 19.7), (-51.9, 19.7))
        make_face()
        with Locations((54.1, -19.7)):
            Circle(F13_R)
        with Locations((-51.9, -19.7)):
            Circle(F13_R)
    extrude(amount=-F14_DEPTH, mode=Mode.SUBTRACT)


solid = f1.part
